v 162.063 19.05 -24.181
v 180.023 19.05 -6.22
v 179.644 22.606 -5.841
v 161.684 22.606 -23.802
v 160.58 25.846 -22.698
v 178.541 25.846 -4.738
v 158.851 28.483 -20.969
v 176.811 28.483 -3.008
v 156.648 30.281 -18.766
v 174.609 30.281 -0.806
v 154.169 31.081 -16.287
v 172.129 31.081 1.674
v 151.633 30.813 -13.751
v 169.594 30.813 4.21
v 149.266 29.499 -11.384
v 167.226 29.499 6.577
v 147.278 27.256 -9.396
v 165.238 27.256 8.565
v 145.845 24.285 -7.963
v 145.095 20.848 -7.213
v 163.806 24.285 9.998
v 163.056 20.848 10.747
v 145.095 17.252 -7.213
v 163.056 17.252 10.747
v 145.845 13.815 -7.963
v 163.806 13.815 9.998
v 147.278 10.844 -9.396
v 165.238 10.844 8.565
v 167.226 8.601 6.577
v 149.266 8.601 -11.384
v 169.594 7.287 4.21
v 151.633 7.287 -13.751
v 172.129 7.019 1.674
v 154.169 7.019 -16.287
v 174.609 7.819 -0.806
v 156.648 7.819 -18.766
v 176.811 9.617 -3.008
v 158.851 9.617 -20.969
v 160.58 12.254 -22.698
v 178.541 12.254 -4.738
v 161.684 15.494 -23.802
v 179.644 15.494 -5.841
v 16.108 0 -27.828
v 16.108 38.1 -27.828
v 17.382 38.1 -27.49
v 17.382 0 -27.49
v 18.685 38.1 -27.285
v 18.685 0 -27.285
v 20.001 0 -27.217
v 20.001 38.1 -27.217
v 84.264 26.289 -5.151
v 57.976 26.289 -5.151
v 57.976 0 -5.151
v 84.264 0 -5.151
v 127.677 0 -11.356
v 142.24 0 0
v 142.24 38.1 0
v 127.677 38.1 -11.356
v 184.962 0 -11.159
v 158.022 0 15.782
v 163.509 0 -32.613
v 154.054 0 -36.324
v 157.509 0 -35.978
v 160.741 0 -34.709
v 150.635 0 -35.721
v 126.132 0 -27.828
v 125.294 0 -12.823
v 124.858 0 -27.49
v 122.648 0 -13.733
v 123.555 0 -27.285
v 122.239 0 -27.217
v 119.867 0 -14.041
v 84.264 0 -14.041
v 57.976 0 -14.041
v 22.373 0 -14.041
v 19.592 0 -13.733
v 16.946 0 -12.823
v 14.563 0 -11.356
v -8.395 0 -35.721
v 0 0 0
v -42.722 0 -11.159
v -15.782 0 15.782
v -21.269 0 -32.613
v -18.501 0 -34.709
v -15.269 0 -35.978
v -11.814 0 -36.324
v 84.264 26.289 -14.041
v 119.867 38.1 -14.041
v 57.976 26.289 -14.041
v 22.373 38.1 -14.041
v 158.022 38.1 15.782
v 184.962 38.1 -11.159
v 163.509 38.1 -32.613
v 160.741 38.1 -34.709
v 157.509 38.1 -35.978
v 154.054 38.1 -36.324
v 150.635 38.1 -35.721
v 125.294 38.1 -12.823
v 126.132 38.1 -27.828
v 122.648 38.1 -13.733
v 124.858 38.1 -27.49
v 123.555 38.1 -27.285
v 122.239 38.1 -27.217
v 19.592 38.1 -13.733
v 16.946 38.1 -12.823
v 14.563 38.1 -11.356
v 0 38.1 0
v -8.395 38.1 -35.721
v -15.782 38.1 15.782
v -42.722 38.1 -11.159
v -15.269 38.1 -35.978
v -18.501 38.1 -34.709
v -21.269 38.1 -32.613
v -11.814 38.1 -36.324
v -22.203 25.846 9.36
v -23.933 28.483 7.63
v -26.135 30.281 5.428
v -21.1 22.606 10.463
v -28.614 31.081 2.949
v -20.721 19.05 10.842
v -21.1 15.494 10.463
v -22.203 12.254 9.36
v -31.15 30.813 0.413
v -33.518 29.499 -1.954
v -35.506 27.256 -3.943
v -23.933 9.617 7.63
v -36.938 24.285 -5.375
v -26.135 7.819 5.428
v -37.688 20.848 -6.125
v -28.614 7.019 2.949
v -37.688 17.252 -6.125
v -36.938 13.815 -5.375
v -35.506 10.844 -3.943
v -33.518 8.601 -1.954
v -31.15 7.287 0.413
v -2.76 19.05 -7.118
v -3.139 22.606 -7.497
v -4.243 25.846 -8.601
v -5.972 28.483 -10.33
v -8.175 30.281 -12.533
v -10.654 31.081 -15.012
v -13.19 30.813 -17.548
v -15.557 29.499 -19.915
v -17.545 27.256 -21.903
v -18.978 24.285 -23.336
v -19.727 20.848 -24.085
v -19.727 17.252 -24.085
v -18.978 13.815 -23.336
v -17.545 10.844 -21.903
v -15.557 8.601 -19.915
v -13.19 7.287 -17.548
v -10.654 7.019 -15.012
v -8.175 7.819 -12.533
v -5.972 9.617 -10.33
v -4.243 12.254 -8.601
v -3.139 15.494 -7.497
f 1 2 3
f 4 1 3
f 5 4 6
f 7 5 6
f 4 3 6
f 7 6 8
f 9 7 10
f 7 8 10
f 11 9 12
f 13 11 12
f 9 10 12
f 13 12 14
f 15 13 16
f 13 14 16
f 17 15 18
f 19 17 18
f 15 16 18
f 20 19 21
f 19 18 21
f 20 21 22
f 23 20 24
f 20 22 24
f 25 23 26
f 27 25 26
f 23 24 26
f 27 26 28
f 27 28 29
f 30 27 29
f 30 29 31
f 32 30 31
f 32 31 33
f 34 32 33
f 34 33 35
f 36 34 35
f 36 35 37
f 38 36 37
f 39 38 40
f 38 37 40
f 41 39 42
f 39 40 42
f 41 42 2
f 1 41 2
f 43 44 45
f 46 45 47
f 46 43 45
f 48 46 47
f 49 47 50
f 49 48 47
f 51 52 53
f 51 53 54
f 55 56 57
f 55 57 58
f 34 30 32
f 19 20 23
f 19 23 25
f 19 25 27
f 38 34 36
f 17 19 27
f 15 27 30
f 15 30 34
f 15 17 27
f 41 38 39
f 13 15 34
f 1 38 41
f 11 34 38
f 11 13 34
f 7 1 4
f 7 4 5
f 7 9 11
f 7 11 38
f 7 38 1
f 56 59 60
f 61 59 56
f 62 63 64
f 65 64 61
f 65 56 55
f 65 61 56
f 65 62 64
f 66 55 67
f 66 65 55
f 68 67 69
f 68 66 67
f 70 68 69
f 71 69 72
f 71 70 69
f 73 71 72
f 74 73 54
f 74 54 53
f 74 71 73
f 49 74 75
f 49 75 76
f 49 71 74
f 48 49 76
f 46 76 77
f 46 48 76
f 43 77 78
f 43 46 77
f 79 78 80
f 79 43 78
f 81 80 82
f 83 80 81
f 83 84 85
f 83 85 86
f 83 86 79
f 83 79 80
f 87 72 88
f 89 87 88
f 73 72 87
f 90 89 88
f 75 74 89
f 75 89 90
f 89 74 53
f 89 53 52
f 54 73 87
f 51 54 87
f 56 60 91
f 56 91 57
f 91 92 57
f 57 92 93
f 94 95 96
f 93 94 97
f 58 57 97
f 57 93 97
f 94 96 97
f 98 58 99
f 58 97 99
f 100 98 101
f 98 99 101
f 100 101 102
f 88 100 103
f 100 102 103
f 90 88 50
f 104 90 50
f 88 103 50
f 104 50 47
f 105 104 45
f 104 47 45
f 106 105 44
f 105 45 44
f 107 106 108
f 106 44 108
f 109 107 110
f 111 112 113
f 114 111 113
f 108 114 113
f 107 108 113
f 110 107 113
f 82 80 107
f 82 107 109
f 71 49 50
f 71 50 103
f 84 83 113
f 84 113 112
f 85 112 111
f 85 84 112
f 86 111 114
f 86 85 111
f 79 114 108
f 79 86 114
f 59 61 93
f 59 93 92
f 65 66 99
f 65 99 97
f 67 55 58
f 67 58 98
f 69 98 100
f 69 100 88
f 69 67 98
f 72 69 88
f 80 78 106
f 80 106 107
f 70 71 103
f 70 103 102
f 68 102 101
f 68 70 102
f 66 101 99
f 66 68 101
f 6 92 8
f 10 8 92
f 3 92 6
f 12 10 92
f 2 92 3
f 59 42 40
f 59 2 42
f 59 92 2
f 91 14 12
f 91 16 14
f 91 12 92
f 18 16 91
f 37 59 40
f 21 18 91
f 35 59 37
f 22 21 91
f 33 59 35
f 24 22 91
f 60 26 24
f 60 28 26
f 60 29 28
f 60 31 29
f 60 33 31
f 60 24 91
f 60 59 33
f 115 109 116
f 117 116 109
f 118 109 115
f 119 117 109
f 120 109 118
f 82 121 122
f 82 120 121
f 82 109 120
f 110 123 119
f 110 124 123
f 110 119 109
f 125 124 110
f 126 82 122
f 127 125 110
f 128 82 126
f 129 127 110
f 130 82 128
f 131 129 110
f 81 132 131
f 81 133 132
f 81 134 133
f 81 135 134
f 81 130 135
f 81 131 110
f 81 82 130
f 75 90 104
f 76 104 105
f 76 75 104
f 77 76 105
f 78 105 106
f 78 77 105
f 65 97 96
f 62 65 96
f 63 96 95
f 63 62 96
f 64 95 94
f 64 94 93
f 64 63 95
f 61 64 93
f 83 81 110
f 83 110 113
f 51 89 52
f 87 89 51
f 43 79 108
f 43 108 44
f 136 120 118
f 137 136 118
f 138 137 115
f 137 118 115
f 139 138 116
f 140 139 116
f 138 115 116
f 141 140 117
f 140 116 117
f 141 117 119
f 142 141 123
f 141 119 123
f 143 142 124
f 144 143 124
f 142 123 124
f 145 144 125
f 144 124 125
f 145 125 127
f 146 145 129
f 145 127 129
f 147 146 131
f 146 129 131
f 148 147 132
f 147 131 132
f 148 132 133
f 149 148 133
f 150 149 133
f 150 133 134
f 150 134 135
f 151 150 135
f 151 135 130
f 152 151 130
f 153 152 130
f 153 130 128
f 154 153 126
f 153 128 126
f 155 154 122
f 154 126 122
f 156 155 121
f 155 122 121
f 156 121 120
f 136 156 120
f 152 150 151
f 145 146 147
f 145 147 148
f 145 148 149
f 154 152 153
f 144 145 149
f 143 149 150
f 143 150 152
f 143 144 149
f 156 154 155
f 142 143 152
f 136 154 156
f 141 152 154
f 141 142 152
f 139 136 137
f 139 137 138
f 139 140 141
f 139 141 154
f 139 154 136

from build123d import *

# Parameters (mm, degrees)
BOSS_EXTRUDE1_DEPTH = 38.1
SKETCH2_R           = 12.065
CUT_EXTRUDE1_DEPTH  = 25.4
SKETCH7_R           = 12.065
CUT_EXTRUDE2_DEPTH  = 25.4
SKETCH8_W           = 26.289
SKETCH8_H           = 26.289
BOSS_EXTRUDE2_DEPTH = 8.89


with BuildPart() as part:
    # Sketch1 → Boss-Extrude1 (new body)
    with BuildSketch(Plane(origin=(0, 0, 0), x_dir=(1, 0, 0), z_dir=(0, 1, 0))):
        with BuildLine():
            Line((-8.394951703, 35.720764917), (16.107614613, 27.828435078))
            ThreePointArc((16.107614613, 27.828435078), (18.03059142, 27.370657964), (20.001310729, 27.216823331))
            Line((20.001310729, 27.216823331), (122.238689271, 27.216823331))
            ThreePointArc((122.238689271, 27.216823331), (124.20940858, 27.370657964), (126.132385387, 27.828435078))
            Line((126.132385387, 27.828435078), (150.634951703, 35.720764917))
            ThreePointArc((150.634951703, 35.720764917), (157.509150211, 35.977683688), (163.508903941, 32.612632786))
            Line((163.508903941, 32.612632786), (184.96230509, 11.159231637))
            Line((184.96230509, 11.159231637), (158.021536726, -15.781536726))
            Line((158.021536726, -15.781536726), (142.24, 0))
            Line((142.24, 0), (127.676821583, 11.356327171))
            ThreePointArc((127.676821583, 11.356327171), (123.996342172, 13.351360126), (119.867179962, 14.041363479))
            Line((119.867179962, 14.041363479), (22.372820038, 14.041363479))
            ThreePointArc((22.372820038, 14.041363479), (18.243657828, 13.351360126), (14.563178417, 11.356327171))
            Line((14.563178417, 11.356327171), (0, 0))
            Line((0, 0), (-15.781536726, -15.781536726))
            Line((-15.781536726, -15.781536726), (-42.72230509, 11.159231637))
            Line((-42.72230509, 11.159231637), (-21.268903941, 32.612632786))
            ThreePointArc((-21.268903941, 32.612632786), (-15.269150211, 35.977683688), (-8.394951703, 35.720764917))
        make_face()
    extrude(amount=BOSS_EXTRUDE1_DEPTH)

    # Sketch2 → Cut-Extrude1 (cut)
    with BuildSketch(Plane(origin=(-15.781536726, 0, 15.781536726), x_dir=(0.7071067811865477, 0, 0.7071067811865475), z_dir=(-0.7071067811865475, 0, 0.7071067811865477))):
        with Locations((-19.05, 19.05)):
            Circle(SKETCH2_R)
    extrude(amount=-CUT_EXTRUDE1_DEPTH, mode=Mode.SUBTRACT)

    # Sketch7 → Cut-Extrude2 (cut)
    with BuildSketch(Plane(origin=(86.901536726, 0, 86.901536726), x_dir=(0.7071067811865472, 0, -0.7071067811865478), z_dir=(0.7071067811865478, 0, 0.7071067811865472))):
        with Locations((119.628868556, 19.05)):
            Circle(SKETCH7_R)
    extrude(amount=-CUT_EXTRUDE2_DEPTH, mode=Mode.SUBTRACT)

    # Sketch8 → Boss-Extrude2 (add)
    with BuildSketch(Plane.XY.offset(-14.041363479)):
        with Locations((71.12, 13.1445)):
            Rectangle(SKETCH8_W, SKETCH8_H)
    extrude(amount=BOSS_EXTRUDE2_DEPTH)


solid = part.part
